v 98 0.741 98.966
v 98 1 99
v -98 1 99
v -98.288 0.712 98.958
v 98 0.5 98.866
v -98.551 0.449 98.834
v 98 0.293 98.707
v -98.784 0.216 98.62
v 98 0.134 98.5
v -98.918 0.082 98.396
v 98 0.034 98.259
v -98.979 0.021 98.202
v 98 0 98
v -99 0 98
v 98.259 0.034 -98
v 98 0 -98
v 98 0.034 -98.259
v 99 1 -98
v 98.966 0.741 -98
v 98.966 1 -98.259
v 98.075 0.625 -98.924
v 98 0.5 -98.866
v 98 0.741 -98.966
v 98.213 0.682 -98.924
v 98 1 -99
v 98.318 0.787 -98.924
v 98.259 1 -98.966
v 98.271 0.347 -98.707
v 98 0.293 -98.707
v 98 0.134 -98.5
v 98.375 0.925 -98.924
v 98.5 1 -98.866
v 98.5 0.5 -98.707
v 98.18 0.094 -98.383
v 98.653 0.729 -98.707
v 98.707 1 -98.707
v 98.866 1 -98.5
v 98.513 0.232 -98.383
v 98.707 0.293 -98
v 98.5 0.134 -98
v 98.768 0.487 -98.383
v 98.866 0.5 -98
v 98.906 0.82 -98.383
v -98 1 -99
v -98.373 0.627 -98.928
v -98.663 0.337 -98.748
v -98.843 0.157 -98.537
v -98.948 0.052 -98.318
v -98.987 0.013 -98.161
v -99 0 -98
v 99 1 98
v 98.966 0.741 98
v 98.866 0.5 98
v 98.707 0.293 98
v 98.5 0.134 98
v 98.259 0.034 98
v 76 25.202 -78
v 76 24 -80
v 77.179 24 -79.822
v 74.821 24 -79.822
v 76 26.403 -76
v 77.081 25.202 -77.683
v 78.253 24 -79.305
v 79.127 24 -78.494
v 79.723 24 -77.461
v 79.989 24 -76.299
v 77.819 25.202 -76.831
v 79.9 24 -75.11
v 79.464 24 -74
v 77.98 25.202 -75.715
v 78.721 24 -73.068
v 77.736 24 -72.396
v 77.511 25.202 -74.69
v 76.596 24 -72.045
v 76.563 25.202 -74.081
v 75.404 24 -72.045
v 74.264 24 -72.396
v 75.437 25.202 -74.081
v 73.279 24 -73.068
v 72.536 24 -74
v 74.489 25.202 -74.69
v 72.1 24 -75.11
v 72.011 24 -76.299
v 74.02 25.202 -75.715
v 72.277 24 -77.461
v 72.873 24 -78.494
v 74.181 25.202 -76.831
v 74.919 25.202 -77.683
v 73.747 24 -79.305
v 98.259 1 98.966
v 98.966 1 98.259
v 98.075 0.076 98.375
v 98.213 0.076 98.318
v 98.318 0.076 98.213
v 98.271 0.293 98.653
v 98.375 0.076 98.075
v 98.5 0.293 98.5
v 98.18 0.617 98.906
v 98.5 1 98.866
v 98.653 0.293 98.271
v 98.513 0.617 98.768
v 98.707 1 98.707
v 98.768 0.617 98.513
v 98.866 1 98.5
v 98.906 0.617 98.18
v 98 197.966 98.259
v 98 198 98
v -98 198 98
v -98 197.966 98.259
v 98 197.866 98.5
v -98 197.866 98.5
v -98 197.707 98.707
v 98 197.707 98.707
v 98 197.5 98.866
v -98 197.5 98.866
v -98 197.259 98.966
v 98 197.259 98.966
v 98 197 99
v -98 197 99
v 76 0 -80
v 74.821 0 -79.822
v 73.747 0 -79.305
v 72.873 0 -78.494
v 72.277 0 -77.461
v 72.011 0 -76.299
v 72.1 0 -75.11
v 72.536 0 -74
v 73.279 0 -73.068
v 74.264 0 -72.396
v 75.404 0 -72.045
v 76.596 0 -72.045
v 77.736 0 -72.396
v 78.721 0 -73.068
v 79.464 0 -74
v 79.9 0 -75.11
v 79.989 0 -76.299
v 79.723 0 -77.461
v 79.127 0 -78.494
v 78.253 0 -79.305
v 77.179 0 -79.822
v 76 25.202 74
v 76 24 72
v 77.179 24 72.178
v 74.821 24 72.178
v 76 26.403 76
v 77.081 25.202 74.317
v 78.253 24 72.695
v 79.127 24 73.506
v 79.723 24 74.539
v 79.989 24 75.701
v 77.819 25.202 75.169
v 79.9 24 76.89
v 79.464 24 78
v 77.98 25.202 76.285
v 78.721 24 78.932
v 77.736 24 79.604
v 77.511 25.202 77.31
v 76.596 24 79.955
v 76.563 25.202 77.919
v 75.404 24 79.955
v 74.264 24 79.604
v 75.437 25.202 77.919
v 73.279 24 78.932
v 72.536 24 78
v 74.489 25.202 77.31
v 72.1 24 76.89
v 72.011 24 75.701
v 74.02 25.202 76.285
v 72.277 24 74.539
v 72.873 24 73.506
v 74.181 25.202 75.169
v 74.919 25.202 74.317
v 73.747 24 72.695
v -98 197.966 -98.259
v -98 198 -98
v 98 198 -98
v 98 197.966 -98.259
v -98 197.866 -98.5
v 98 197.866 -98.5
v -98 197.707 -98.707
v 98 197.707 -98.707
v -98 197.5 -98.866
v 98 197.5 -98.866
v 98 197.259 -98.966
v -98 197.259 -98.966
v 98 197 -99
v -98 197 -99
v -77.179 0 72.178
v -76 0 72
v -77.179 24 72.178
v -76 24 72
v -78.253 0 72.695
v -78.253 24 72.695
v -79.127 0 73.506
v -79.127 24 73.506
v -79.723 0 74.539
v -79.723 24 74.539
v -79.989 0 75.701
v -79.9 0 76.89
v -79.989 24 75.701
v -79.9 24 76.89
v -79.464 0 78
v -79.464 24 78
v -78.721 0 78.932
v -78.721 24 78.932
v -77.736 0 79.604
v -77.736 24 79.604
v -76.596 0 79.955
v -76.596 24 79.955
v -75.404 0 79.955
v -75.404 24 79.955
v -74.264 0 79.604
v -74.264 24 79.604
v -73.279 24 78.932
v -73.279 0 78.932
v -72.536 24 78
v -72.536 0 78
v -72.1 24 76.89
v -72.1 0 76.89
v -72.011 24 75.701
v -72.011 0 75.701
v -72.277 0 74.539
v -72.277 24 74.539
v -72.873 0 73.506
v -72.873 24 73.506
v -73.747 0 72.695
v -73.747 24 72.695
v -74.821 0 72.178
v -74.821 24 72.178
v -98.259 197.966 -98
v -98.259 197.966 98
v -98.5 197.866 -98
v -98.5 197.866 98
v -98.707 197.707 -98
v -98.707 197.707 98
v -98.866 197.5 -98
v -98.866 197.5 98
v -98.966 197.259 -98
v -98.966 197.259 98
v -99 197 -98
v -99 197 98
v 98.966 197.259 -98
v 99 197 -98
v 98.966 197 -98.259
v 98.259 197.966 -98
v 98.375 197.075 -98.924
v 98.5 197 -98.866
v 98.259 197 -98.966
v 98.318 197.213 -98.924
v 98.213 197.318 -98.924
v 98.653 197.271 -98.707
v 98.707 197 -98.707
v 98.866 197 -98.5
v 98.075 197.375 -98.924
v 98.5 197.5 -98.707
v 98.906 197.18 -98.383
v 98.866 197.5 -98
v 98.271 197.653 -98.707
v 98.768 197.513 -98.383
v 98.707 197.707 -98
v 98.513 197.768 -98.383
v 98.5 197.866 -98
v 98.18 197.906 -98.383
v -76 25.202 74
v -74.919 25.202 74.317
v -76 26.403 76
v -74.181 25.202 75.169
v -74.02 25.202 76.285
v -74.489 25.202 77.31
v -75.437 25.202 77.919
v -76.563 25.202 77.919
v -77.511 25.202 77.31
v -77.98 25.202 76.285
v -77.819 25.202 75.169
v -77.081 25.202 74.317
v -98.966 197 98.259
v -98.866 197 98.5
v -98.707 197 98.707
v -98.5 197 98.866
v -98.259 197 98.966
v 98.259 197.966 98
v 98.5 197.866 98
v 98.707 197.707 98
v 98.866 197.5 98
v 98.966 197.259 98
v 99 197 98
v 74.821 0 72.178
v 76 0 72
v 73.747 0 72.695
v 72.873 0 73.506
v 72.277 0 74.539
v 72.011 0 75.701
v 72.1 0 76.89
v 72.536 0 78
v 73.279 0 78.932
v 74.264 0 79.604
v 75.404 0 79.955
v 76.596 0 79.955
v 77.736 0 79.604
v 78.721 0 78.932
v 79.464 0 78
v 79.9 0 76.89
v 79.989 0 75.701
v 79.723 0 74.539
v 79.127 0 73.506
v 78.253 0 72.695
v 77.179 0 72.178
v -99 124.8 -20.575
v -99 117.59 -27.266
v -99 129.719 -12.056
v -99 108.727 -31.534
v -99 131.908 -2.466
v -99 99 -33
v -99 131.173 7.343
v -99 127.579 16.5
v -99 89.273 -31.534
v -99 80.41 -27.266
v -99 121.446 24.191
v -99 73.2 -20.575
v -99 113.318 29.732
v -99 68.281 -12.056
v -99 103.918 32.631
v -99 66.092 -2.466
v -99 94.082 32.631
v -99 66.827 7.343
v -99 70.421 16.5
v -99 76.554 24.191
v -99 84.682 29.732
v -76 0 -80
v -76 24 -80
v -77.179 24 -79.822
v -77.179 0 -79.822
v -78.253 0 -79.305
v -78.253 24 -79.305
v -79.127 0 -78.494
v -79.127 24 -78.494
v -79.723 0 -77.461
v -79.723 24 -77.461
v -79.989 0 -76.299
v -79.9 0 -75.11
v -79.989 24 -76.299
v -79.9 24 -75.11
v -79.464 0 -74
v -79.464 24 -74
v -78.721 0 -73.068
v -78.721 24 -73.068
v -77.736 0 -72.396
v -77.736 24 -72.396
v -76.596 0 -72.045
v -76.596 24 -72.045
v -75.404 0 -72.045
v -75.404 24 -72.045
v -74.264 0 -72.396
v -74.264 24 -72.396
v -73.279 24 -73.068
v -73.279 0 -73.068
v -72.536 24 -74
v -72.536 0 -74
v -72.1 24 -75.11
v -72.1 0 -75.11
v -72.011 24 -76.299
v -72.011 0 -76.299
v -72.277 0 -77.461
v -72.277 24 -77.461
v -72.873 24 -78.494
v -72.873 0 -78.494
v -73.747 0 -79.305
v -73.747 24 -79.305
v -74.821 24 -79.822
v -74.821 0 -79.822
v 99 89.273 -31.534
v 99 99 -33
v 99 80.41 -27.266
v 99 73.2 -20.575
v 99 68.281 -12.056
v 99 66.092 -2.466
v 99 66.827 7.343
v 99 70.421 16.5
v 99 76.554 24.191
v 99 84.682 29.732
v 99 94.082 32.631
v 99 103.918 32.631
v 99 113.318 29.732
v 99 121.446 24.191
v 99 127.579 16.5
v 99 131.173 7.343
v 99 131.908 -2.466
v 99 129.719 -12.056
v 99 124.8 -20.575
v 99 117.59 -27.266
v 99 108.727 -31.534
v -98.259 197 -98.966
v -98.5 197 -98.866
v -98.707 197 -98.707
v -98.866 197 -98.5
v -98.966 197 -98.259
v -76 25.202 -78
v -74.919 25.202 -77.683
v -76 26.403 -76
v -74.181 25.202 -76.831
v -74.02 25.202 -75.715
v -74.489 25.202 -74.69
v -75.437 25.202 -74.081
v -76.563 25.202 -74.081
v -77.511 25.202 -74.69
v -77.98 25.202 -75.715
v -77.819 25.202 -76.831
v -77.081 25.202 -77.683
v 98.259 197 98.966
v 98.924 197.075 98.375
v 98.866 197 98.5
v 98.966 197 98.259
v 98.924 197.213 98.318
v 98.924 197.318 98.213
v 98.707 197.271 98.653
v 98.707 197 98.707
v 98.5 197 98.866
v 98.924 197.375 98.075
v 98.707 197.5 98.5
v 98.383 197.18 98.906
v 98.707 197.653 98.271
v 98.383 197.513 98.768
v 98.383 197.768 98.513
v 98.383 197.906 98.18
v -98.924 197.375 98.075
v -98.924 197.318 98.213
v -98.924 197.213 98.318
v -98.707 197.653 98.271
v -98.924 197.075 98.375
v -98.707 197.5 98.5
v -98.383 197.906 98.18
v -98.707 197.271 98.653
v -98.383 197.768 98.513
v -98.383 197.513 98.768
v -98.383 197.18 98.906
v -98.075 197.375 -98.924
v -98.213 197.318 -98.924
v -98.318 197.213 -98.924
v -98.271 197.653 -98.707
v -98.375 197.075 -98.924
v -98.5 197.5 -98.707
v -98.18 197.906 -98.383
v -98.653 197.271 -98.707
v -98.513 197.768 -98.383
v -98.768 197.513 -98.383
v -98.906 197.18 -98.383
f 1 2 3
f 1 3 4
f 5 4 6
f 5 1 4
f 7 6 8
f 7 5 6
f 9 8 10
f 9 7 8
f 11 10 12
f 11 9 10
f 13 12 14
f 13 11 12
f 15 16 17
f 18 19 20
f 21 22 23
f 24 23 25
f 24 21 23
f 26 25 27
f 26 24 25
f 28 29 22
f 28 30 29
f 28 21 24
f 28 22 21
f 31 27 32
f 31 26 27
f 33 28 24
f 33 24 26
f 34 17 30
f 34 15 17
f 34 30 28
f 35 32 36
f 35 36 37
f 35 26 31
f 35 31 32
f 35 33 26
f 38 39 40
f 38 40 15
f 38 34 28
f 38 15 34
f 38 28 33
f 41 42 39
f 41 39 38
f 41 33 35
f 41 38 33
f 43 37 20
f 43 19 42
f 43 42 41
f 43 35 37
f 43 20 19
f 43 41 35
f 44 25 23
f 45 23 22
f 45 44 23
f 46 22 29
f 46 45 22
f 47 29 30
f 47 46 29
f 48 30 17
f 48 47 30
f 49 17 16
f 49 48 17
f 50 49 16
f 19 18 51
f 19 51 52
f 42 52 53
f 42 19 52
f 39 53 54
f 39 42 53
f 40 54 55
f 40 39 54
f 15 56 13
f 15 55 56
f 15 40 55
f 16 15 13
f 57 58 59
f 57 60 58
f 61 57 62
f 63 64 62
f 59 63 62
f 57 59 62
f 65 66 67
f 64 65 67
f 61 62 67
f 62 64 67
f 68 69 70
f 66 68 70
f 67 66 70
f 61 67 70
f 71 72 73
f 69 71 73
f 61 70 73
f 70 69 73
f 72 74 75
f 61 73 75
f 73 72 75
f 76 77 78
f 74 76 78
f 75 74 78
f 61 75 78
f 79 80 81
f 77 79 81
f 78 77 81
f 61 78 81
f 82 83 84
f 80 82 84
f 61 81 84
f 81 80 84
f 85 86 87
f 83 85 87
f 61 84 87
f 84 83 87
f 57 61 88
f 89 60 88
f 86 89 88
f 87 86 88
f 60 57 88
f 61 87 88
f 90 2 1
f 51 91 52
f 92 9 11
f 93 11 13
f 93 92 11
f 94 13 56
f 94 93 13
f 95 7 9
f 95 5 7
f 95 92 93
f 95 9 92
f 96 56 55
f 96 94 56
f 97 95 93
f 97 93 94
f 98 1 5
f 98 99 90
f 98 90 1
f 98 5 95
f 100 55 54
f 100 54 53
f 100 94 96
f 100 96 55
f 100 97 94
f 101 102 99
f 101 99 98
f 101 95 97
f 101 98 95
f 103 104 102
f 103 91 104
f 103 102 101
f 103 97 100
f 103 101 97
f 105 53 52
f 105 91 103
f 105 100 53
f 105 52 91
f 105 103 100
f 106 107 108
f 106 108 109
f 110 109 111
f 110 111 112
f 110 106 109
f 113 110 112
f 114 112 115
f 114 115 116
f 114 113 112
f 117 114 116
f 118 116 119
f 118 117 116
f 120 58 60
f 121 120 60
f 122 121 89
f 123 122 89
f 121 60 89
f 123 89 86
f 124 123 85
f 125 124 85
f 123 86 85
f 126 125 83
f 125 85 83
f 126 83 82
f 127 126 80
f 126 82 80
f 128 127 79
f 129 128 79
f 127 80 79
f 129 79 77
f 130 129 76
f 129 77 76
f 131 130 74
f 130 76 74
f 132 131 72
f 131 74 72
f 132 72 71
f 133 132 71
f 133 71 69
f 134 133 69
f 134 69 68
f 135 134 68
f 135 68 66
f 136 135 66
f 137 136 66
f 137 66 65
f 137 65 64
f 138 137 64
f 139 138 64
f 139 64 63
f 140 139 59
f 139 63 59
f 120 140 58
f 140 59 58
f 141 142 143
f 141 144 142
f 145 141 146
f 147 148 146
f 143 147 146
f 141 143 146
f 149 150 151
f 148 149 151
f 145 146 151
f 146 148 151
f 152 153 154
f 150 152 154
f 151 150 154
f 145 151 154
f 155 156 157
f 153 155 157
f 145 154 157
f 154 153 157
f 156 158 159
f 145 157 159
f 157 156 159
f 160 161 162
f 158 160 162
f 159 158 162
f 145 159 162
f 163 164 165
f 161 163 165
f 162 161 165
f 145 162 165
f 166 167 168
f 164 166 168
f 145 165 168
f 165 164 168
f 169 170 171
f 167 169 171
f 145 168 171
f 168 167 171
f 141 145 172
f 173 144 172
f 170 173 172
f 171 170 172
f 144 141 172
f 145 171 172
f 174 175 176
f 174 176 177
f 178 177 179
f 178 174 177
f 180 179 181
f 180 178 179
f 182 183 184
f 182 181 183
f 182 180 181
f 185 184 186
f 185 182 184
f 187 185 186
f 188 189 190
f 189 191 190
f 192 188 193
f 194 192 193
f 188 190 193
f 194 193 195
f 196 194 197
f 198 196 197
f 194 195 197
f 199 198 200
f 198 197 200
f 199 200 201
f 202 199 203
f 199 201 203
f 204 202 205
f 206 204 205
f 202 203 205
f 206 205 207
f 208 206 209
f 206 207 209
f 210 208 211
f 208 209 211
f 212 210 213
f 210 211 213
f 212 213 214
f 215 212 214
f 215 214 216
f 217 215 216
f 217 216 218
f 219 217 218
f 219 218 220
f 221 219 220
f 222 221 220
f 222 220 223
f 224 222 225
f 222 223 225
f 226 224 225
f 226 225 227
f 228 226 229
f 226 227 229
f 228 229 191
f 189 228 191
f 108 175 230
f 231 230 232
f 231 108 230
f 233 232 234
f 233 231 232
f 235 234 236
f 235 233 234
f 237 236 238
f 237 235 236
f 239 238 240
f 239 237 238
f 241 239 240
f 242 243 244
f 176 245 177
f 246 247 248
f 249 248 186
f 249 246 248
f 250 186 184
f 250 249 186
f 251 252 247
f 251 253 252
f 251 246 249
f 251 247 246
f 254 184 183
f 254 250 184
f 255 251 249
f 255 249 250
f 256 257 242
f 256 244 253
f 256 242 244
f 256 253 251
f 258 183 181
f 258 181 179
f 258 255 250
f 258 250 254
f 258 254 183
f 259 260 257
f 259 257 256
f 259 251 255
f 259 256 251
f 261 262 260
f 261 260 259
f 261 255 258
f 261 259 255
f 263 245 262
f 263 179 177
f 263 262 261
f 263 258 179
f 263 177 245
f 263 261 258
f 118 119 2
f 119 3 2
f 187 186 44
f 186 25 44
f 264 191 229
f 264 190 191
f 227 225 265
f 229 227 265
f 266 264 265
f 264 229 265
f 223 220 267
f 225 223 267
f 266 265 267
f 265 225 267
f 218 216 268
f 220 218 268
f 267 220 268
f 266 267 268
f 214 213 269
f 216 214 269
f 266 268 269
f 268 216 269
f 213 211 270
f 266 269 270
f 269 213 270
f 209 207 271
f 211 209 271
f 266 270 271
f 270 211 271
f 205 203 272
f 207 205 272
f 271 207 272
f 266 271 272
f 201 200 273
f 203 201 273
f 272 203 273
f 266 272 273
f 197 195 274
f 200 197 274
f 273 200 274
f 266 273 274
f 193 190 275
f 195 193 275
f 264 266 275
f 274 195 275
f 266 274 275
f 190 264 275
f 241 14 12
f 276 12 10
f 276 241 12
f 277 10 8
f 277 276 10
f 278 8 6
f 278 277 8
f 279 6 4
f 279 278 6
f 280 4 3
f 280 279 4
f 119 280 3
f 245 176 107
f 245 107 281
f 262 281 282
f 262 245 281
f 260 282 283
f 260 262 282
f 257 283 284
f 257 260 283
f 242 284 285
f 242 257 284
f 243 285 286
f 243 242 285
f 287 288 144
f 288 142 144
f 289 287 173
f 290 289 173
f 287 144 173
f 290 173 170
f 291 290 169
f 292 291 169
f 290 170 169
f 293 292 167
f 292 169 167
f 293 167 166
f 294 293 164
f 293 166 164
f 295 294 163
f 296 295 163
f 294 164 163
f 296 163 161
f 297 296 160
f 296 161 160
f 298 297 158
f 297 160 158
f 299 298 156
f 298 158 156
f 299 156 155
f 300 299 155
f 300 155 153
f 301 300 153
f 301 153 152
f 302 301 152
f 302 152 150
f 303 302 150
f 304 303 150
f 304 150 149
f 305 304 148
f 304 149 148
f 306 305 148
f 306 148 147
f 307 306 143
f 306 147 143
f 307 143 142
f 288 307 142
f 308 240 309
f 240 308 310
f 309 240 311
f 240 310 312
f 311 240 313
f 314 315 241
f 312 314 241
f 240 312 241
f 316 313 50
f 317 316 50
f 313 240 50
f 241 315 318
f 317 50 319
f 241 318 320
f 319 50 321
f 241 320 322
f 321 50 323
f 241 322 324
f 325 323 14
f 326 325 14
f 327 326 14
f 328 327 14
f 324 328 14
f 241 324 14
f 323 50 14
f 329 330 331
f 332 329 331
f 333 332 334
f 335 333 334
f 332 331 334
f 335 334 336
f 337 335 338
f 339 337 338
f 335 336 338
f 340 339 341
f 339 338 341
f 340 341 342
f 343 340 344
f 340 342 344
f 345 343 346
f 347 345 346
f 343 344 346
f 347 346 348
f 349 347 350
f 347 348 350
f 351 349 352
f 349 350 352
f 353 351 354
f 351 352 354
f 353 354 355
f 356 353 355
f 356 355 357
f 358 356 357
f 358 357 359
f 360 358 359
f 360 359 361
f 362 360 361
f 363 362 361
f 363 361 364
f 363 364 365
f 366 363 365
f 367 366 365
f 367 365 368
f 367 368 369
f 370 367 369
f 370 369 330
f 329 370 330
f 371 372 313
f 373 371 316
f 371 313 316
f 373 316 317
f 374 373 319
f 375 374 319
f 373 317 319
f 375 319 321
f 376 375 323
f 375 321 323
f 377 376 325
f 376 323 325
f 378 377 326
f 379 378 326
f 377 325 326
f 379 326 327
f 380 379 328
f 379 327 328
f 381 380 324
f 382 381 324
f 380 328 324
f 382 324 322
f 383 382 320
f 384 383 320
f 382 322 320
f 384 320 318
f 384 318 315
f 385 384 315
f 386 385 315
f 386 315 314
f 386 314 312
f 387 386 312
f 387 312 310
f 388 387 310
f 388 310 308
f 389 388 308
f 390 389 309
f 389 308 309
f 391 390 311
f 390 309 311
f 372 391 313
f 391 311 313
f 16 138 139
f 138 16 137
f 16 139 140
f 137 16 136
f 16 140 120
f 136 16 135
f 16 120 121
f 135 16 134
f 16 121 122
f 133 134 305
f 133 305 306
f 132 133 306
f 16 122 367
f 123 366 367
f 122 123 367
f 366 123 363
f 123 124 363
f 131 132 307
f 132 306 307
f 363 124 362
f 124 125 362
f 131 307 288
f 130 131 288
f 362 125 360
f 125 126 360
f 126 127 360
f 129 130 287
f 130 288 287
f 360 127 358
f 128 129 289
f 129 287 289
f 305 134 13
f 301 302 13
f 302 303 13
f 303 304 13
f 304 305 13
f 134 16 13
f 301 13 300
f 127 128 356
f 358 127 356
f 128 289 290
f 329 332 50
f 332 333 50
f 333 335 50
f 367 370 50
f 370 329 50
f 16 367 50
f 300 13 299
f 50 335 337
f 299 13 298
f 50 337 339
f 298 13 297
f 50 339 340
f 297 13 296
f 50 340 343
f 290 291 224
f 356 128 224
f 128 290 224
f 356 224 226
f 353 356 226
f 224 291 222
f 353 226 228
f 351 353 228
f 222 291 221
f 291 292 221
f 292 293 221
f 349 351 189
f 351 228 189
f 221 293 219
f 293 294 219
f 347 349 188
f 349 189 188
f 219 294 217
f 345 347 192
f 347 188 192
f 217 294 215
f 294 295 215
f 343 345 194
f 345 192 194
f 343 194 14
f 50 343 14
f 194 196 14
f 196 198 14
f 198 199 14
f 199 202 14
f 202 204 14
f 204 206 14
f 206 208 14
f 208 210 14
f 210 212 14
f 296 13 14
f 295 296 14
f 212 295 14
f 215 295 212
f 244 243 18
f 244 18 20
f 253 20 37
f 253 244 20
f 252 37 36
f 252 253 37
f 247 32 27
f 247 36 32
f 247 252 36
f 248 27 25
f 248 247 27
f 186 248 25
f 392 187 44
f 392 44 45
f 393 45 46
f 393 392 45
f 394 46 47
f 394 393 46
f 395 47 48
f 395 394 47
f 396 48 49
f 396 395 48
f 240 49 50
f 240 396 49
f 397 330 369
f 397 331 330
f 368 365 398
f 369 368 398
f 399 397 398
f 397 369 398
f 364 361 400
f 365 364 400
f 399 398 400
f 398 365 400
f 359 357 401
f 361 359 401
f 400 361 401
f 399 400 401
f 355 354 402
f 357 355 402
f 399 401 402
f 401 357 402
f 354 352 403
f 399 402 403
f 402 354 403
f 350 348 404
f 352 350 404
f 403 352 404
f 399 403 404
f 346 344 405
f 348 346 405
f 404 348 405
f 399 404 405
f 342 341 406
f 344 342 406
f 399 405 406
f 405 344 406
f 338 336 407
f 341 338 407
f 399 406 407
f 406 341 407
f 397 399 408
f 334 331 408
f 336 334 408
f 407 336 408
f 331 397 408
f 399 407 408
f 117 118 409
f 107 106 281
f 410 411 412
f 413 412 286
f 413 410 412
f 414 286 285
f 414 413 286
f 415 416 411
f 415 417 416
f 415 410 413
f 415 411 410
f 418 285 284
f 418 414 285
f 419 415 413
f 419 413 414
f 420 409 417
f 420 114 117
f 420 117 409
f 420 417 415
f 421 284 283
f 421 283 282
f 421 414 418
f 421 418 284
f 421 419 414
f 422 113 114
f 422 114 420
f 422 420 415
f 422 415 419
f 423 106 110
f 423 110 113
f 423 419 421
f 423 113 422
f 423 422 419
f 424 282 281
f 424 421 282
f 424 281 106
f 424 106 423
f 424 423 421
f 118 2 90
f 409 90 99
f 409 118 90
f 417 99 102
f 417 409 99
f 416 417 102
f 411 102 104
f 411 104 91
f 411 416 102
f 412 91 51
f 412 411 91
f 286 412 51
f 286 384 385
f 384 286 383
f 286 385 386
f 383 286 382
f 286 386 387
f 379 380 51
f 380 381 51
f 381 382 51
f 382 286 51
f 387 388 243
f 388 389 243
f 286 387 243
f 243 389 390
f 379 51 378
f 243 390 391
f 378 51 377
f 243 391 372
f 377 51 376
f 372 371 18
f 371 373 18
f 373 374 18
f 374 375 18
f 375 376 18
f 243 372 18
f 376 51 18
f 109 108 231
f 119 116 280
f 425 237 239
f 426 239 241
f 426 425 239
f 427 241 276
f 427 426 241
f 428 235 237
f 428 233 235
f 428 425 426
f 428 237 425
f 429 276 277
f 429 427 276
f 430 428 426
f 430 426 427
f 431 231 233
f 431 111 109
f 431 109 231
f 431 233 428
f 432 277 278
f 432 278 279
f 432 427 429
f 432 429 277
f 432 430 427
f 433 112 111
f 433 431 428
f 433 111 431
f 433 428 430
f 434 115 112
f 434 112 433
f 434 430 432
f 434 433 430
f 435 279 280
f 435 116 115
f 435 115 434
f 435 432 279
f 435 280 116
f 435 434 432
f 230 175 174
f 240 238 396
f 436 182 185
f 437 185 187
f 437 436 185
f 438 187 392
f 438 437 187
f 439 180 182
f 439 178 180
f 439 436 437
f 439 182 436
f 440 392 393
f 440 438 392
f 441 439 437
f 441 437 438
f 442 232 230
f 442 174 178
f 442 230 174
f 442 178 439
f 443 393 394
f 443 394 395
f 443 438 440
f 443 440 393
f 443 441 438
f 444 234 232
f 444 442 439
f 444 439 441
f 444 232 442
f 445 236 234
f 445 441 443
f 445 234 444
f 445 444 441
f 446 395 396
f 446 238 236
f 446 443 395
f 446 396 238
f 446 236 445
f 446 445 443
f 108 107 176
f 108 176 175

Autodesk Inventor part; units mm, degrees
ref_plane "YZ Plane" through (0, 0, 0) normal (1, 0, 0) x (0, 1, 0)
ref_plane "XZ Plane" through (0, 0, 0) normal (0, 1, 0) x (-1, 0, 0)
ref_plane "XY Plane" through (0, 0, 0) normal (0, 0, 1) x (1, 0, 0)
sketch "Sketch1" plane through (0, 0, 0) normal (0, 1, 0) x (-1, 0, 0)
  line L0 (99, 99) -> (-99, 99)
  line L1 (-99, 99) -> (-99, -99)
  line L2 (-99, -99) -> (99, -99)
  line L3 (99, -99) -> (99, 99)
  line L4 (99, 99) -> (-99, -99) construction
  line L5 (-99, 99) -> (99, -99) construction
  point P0 (0, 0)
  dimension "d0" = 198
  dimension "d1" = 198
extrude "Box" add sketch "Sketch1" along normal blind 198
sketch "Sketch2" plane through (99, 0, 99) normal (1, 0, 0) x (0, 0, -1)
  point P0 (99, 0)
  point P1 (99, 99)
hole "DecAxisHole" at (99, 99, 0) direction (-1, 0, 0) diameter 66 depth 198
sketch "Sketch3" plane through (0, 0, 0) normal (0, -1, 0) x (1, 0, 0)
  point P0 (0, 0)
  point P1 (-76, -76)
  point P2 (76, -76)
  point P3 (76, 76)
  point P4 (-76, 76)
hole "BoltHoles" at (-76, 0, -76) at (76, 0, -76) at (76, 0, 76) at (-76, 0, 76) direction (0, 1, 0) diameter 8 depth 24 tip angle 118
fillet "Fillet1" radius 1 11 edges at (0, 198, 99) (-99, 198, 0) (99, 198, 0) (99, 99, 99) (-99, 99, 99) (0, 0, 99) (99, 0, 0) (99, 99, -99) (0, 0, -99) (0, 198, -99) (-99, 99, -99)
properties part number "RaDecConnector"
